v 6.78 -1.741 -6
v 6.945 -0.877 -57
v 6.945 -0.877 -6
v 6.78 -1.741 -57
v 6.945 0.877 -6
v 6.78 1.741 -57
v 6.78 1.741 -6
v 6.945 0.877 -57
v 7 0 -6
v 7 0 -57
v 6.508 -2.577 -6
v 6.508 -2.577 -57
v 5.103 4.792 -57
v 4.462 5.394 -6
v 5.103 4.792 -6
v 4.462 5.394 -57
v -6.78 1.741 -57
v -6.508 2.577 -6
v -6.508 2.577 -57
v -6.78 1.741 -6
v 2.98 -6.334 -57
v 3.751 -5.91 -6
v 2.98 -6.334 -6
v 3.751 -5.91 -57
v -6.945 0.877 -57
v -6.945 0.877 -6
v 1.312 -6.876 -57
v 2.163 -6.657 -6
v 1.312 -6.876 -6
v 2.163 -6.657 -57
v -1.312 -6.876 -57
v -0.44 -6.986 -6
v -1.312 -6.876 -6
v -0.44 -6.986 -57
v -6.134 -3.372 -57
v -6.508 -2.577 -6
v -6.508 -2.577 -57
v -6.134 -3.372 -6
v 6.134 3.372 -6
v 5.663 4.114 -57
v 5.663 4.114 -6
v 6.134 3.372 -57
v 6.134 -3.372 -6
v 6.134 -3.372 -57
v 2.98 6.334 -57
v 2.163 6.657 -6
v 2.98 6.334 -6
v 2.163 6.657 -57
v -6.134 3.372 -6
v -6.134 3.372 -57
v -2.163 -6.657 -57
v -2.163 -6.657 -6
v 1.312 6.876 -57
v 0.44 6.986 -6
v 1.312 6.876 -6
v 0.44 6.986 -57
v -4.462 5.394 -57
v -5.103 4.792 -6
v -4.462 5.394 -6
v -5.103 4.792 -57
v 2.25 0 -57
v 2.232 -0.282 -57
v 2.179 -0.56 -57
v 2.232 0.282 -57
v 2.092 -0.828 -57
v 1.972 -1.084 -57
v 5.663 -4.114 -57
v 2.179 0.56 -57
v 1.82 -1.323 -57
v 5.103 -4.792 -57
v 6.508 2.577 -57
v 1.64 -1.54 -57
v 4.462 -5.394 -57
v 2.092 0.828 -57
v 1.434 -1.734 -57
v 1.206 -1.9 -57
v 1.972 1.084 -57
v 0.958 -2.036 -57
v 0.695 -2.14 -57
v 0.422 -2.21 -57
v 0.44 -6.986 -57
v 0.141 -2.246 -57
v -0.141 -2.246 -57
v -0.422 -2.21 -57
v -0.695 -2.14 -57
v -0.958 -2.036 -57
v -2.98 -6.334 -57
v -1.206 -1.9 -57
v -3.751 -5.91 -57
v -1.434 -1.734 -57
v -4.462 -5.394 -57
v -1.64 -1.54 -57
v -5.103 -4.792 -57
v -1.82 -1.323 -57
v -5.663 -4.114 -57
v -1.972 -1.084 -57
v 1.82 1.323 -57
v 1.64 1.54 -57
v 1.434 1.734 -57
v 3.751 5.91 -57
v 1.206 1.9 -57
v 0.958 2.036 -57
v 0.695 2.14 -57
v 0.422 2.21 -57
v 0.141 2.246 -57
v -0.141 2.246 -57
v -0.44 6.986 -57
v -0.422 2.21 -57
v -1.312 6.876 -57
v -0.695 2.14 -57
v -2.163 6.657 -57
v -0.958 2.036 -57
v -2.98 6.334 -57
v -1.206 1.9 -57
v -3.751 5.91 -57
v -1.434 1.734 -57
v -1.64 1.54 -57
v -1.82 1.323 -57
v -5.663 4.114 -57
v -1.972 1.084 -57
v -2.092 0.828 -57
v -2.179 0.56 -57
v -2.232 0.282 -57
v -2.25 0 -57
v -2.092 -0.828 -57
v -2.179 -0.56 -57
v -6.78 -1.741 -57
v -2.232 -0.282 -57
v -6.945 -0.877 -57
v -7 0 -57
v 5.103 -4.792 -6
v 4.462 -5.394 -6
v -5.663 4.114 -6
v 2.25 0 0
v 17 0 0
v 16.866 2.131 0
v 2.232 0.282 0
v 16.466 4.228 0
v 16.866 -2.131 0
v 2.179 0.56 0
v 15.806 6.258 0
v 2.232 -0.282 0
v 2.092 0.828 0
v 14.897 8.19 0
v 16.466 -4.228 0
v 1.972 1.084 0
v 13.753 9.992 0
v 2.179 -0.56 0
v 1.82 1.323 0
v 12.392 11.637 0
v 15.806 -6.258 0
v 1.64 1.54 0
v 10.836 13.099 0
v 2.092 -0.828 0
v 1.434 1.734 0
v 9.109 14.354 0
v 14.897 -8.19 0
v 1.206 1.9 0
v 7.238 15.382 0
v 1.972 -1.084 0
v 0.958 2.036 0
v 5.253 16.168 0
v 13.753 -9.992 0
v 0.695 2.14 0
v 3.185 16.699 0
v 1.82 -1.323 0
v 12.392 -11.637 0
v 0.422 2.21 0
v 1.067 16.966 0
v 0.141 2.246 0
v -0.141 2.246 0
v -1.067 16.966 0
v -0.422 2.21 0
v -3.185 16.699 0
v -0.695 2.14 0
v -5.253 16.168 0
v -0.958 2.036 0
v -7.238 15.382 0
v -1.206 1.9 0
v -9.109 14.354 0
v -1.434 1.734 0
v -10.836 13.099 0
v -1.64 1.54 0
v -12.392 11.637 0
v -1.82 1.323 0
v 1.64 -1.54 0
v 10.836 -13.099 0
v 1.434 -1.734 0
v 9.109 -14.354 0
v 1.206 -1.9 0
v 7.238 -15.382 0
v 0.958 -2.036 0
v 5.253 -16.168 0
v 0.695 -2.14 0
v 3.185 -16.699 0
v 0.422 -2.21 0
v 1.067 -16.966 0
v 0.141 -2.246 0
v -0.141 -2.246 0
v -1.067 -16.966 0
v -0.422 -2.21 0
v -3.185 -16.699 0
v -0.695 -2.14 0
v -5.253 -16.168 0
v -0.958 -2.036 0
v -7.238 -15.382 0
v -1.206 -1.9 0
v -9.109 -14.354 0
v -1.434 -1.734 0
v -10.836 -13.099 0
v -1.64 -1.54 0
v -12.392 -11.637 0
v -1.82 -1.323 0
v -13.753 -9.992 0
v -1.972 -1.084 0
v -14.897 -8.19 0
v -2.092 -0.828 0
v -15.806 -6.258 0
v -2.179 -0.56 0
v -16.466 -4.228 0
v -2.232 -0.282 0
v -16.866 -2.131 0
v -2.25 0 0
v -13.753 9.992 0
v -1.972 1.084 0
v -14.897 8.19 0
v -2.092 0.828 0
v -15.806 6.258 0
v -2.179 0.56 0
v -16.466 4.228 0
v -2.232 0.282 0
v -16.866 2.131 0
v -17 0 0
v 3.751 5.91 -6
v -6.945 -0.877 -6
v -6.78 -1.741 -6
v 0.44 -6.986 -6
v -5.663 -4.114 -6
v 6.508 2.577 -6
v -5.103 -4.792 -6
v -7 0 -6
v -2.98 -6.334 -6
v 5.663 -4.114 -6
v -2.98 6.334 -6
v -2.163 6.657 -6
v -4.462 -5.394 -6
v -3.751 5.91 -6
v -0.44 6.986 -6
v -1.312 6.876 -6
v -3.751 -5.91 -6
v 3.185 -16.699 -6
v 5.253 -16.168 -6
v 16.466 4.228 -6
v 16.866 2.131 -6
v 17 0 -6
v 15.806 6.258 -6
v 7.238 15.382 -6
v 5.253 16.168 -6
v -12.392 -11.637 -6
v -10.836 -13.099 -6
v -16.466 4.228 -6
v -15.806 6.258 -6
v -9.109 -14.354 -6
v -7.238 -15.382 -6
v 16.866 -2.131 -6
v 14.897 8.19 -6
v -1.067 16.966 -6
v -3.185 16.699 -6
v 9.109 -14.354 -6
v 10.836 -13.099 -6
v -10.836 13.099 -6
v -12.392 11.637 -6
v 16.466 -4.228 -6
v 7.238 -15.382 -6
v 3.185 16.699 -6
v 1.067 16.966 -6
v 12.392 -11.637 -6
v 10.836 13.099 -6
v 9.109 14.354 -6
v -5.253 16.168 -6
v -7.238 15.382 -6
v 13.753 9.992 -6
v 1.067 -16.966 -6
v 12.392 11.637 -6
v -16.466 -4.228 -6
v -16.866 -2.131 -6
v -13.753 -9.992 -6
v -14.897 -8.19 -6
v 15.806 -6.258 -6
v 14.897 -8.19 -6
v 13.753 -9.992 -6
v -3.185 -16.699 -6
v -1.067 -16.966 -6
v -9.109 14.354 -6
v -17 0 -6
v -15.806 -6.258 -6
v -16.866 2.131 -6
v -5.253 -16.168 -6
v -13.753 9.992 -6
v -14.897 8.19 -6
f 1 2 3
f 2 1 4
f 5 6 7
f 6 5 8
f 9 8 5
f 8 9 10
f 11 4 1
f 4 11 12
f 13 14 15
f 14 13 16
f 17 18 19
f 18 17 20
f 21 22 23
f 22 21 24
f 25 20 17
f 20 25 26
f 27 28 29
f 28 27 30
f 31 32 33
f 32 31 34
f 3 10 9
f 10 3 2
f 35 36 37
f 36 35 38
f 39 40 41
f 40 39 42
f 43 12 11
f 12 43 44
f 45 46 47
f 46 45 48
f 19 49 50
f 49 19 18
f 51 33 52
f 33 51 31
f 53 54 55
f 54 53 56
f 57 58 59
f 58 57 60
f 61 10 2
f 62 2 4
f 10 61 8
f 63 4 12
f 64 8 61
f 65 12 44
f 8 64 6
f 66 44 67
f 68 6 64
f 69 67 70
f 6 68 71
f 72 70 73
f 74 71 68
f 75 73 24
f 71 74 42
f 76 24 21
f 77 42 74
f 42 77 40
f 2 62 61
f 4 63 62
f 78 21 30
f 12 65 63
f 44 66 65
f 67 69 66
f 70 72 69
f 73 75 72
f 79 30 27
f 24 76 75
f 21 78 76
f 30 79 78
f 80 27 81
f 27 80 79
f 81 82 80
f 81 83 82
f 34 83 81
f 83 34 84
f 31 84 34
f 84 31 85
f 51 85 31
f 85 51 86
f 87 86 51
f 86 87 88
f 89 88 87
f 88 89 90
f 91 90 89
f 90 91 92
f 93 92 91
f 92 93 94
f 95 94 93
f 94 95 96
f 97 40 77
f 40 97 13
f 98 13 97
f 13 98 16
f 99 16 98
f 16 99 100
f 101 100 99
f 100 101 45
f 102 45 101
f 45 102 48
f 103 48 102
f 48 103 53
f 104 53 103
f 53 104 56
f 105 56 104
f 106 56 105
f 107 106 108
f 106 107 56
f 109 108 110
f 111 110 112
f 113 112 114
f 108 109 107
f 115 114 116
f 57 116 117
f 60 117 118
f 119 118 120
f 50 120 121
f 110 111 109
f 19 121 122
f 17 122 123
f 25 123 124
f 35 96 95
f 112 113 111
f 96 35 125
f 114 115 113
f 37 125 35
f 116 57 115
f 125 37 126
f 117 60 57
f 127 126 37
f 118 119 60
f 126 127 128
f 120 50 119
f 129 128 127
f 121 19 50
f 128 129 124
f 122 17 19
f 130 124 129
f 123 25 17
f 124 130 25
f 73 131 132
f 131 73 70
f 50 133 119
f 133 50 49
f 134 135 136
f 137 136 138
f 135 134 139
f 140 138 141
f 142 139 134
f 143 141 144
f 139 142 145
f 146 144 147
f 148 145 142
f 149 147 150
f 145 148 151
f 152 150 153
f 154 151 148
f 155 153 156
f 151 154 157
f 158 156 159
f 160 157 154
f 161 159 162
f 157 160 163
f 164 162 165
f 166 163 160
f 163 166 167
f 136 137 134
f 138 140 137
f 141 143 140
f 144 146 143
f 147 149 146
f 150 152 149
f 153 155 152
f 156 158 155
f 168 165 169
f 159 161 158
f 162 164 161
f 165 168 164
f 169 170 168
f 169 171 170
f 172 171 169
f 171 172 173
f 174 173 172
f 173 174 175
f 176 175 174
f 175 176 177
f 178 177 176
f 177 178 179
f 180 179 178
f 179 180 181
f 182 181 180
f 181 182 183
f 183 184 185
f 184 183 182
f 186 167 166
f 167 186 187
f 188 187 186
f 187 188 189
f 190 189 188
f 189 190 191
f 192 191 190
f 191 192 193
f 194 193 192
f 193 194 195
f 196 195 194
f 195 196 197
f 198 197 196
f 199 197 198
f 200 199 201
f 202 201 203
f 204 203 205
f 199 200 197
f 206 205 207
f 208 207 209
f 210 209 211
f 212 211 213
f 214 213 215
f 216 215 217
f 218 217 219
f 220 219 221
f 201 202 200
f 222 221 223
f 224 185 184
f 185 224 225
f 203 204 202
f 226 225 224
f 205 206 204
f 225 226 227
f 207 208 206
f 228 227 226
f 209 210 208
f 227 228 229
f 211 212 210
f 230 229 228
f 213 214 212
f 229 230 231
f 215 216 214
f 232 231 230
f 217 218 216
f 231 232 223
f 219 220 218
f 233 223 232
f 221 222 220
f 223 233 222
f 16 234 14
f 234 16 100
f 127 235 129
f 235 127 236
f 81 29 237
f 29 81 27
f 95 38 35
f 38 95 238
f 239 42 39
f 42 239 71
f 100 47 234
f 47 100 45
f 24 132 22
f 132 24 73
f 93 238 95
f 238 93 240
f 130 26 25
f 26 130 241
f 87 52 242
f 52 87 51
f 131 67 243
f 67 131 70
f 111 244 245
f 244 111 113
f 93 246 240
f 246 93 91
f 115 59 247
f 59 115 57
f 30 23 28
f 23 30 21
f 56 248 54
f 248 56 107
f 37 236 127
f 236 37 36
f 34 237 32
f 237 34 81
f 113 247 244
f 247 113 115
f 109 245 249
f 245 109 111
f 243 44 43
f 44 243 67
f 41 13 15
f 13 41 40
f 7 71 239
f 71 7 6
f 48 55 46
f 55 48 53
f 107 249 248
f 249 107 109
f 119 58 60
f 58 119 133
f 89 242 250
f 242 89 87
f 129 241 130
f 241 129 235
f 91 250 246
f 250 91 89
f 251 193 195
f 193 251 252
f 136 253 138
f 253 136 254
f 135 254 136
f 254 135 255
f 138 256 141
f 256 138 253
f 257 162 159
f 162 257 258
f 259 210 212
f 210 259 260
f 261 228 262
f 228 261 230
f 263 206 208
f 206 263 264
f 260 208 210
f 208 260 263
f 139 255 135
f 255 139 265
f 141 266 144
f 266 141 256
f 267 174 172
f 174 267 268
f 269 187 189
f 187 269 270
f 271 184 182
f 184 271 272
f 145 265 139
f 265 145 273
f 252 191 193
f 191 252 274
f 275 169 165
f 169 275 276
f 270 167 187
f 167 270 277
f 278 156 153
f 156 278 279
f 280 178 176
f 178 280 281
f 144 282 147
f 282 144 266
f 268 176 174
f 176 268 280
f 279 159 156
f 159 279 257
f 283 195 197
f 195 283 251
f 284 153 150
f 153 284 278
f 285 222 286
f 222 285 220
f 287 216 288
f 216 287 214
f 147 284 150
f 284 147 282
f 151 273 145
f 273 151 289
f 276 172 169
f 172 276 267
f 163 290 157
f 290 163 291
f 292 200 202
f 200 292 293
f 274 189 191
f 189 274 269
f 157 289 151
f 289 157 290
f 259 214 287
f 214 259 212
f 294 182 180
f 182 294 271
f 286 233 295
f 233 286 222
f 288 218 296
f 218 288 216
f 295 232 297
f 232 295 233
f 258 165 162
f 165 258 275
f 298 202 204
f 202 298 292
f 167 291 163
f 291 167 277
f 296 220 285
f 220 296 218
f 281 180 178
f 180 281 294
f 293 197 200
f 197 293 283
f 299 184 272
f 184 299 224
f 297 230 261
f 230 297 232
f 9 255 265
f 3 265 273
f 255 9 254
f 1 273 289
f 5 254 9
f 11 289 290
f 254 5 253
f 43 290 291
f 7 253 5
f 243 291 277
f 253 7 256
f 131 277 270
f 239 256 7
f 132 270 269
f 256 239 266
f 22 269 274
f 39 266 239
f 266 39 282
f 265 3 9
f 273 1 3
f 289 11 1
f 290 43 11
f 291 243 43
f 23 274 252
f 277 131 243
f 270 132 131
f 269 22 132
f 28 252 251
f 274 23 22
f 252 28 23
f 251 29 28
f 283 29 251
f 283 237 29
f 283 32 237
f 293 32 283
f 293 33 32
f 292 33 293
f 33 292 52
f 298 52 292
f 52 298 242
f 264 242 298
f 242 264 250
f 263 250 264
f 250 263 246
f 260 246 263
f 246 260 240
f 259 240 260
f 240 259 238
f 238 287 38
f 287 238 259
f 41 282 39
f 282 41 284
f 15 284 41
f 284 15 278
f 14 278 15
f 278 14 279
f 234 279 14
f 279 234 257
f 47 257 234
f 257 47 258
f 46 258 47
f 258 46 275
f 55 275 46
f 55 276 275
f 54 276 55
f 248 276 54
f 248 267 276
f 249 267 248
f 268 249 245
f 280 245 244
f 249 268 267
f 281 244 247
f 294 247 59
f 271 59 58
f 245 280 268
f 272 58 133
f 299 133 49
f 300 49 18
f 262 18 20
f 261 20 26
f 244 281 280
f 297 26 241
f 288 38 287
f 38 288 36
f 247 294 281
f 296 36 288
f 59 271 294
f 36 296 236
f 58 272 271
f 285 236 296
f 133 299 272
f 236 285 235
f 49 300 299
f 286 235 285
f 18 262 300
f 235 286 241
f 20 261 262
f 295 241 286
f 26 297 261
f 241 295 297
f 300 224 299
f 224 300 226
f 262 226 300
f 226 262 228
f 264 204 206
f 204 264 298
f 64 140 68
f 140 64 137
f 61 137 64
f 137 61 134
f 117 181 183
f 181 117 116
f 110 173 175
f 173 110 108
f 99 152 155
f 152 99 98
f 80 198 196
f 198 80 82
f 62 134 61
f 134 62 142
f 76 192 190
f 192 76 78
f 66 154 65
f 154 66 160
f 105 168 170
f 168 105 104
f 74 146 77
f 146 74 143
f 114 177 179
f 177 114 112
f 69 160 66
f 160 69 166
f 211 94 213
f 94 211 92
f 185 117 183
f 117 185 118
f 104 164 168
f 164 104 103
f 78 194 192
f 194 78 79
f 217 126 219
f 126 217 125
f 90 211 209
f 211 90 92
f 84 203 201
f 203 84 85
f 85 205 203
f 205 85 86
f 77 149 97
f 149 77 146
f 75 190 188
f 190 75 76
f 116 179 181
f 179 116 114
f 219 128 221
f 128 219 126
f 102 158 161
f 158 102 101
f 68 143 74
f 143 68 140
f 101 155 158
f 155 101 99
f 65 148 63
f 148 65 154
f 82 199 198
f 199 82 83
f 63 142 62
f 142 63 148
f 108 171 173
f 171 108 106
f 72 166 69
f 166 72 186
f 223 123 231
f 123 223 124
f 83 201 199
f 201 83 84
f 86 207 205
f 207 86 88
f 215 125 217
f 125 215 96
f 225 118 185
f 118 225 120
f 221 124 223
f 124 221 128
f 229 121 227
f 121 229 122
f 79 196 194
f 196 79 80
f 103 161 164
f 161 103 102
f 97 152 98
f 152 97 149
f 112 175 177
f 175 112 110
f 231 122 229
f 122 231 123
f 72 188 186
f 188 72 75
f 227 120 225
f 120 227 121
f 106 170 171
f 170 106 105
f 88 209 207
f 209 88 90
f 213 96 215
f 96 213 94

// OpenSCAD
$fn = 50;


difference() {
	union() {
		translate(v = [0, 0, -57.0000000000]) {
			cylinder(h = 57, r = 7.0000000000);
		}
		translate(v = [0, 0, -6.0000000000]) {
			cylinder(h = 6, r = 17.0000000000);
		}
	}
	union() {
		#translate(v = [0, 0, -57]) {
			cylinder(h = 57, r = 2.2500000000);
		}
	}
}
